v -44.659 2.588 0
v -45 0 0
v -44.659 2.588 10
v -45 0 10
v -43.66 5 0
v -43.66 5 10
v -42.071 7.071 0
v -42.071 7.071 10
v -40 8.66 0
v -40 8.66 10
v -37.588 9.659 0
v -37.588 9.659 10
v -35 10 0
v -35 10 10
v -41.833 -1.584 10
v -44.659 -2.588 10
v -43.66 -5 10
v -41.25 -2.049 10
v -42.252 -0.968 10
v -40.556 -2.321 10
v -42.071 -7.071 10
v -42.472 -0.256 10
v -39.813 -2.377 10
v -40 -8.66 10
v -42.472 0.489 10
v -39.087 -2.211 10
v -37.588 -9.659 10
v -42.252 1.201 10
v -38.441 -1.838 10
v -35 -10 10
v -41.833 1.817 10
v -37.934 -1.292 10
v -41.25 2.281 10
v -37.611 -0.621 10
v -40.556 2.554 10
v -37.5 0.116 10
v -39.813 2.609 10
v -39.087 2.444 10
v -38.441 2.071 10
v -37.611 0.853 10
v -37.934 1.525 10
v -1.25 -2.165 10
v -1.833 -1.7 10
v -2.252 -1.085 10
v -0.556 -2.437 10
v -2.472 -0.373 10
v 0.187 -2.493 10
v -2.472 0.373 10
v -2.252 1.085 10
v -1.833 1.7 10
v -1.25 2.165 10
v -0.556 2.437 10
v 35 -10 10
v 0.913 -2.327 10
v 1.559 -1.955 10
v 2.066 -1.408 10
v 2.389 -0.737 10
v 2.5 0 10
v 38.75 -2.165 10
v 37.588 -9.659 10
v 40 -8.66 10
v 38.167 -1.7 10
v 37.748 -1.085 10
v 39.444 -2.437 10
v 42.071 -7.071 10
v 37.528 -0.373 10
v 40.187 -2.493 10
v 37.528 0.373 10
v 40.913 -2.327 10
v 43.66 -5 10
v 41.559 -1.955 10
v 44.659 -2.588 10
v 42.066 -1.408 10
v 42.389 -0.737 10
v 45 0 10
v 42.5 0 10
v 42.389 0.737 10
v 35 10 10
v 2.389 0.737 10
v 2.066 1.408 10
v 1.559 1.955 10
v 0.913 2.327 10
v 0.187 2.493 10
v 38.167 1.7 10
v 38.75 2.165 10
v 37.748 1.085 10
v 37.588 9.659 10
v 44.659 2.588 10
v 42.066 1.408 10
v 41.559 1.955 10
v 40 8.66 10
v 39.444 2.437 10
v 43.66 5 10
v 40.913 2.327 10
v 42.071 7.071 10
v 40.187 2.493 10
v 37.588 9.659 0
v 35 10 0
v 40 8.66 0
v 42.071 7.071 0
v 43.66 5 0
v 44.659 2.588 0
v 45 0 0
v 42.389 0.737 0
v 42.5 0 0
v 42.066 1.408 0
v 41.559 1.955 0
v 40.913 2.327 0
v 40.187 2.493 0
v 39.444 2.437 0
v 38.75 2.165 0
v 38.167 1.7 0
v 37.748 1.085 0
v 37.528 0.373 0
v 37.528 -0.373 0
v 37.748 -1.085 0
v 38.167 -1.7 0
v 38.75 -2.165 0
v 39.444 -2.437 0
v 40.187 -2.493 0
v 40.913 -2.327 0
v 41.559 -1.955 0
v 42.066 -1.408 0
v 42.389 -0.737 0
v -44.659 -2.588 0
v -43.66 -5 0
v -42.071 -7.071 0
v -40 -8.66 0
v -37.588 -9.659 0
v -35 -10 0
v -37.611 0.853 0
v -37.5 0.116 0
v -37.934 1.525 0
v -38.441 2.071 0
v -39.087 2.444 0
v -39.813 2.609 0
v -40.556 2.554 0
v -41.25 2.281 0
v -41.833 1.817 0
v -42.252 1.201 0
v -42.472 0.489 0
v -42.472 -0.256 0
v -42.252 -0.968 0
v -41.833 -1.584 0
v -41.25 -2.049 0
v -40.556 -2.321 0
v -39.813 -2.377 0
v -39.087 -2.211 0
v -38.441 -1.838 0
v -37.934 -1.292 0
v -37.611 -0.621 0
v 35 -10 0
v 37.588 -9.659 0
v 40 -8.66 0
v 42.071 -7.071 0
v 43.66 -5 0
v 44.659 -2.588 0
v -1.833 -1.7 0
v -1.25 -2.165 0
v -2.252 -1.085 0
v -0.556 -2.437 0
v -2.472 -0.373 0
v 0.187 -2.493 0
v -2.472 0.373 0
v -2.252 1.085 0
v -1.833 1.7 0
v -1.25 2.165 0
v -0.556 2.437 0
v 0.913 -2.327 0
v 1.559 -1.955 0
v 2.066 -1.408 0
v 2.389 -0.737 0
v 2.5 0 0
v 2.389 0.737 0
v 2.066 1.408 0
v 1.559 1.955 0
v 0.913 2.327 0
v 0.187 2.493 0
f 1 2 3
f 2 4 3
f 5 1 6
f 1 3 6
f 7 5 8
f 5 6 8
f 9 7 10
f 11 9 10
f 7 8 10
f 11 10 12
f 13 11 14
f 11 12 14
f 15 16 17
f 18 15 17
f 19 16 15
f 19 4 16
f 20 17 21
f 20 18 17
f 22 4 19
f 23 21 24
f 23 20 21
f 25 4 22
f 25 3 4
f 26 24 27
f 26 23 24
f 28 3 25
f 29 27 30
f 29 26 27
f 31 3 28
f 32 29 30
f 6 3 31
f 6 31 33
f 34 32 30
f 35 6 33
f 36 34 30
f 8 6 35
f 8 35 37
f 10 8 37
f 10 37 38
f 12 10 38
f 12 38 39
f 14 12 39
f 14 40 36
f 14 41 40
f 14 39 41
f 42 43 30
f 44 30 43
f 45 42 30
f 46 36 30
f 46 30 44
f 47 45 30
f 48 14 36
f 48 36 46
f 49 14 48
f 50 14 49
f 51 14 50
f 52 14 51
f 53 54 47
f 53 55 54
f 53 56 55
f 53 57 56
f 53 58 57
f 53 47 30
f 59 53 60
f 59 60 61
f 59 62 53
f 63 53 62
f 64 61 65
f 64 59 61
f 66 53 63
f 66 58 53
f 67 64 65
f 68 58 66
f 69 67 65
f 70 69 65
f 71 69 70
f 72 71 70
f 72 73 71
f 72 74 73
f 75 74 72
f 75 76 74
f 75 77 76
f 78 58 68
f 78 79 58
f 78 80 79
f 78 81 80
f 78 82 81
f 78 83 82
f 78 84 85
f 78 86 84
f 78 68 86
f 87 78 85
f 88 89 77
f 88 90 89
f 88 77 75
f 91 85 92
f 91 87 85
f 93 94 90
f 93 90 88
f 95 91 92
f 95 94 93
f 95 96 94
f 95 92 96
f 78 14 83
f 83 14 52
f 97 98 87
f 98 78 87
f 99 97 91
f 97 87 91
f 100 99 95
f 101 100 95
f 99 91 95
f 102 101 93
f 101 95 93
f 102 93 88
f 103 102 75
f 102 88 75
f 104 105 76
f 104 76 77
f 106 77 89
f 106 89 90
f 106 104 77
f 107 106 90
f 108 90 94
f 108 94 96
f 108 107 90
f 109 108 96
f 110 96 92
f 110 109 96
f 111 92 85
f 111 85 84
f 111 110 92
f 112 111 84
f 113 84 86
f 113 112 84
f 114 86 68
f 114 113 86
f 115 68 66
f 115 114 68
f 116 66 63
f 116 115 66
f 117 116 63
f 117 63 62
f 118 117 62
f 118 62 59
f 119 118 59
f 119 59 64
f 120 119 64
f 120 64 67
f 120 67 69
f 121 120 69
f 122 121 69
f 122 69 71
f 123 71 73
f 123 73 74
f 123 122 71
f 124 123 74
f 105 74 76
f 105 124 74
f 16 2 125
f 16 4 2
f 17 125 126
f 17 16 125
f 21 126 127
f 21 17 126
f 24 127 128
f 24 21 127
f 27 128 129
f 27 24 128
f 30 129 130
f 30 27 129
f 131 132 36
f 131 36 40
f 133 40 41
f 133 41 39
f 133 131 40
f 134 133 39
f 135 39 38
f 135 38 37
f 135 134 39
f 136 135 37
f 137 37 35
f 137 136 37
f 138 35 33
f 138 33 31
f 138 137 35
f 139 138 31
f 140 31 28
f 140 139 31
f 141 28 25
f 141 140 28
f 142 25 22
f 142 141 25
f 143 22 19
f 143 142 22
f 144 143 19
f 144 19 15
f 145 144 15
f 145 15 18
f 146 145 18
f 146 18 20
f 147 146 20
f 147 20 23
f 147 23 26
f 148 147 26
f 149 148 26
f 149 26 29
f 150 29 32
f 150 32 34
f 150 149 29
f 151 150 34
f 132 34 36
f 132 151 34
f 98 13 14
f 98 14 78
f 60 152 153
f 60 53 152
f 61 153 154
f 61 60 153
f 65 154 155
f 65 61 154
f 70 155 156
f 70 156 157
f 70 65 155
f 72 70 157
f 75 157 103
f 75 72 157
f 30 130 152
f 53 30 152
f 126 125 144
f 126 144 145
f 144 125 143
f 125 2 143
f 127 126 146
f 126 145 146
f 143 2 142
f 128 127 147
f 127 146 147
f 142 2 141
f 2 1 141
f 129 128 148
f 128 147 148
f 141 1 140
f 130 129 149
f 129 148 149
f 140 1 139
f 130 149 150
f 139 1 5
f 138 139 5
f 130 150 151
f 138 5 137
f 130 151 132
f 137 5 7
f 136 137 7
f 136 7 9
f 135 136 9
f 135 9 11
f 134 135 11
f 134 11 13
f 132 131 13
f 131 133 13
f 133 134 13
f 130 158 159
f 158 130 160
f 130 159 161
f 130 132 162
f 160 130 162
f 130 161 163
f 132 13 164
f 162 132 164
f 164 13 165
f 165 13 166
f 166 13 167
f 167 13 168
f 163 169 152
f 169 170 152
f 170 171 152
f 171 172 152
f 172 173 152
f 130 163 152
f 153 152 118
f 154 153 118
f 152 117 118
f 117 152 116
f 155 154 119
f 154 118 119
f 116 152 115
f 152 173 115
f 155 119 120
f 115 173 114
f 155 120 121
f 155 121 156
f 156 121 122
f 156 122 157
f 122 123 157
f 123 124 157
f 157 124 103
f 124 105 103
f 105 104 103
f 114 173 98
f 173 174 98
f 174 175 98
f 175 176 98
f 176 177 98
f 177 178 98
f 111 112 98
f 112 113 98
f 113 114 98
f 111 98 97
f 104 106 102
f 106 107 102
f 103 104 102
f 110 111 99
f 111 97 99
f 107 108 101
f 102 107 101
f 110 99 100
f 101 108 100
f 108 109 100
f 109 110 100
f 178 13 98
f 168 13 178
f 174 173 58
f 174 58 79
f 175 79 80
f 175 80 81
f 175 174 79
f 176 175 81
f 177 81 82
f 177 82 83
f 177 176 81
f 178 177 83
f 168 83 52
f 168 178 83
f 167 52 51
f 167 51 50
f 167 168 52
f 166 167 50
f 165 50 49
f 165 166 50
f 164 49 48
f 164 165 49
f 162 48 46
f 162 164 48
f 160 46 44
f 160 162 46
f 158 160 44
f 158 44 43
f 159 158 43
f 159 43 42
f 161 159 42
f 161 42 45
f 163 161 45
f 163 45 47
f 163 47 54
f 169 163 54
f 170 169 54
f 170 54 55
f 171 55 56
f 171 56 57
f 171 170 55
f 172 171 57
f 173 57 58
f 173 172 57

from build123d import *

# Parameters (mm, degrees)
SKETCH1_W           = 90
SKETCH1_H           = 20
SKETCH1_R           = 2.5
BOSS_EXTRUDE1_DEPTH = 10
FILLET1_R           = 10


with BuildPart() as part:
    # Sketch1 → Boss-Extrude1 (new body)
    with BuildSketch(Plane.XY):
        Rectangle(SKETCH1_W, SKETCH1_H)
        with Locations((-40, 0.116382556)):
            Circle(SKETCH1_R, mode=Mode.SUBTRACT)
        with Locations((40, 0)):
            Circle(SKETCH1_R, mode=Mode.SUBTRACT)
        Circle(SKETCH1_R, mode=Mode.SUBTRACT)
    extrude(amount=BOSS_EXTRUDE1_DEPTH)

    # Fillet1
    fillet1_edges = [part.edges().sort_by_distance(p)[0] for p in [
        (45, -10, 5),
        (45, 10, 5),
        (-45, -10, 5),
        (-45, 10, 5),
    ]]
    fillet(fillet1_edges, radius=FILLET1_R - 0.0001)  # a hair under: the kernel refuses the full size


solid = part.part
